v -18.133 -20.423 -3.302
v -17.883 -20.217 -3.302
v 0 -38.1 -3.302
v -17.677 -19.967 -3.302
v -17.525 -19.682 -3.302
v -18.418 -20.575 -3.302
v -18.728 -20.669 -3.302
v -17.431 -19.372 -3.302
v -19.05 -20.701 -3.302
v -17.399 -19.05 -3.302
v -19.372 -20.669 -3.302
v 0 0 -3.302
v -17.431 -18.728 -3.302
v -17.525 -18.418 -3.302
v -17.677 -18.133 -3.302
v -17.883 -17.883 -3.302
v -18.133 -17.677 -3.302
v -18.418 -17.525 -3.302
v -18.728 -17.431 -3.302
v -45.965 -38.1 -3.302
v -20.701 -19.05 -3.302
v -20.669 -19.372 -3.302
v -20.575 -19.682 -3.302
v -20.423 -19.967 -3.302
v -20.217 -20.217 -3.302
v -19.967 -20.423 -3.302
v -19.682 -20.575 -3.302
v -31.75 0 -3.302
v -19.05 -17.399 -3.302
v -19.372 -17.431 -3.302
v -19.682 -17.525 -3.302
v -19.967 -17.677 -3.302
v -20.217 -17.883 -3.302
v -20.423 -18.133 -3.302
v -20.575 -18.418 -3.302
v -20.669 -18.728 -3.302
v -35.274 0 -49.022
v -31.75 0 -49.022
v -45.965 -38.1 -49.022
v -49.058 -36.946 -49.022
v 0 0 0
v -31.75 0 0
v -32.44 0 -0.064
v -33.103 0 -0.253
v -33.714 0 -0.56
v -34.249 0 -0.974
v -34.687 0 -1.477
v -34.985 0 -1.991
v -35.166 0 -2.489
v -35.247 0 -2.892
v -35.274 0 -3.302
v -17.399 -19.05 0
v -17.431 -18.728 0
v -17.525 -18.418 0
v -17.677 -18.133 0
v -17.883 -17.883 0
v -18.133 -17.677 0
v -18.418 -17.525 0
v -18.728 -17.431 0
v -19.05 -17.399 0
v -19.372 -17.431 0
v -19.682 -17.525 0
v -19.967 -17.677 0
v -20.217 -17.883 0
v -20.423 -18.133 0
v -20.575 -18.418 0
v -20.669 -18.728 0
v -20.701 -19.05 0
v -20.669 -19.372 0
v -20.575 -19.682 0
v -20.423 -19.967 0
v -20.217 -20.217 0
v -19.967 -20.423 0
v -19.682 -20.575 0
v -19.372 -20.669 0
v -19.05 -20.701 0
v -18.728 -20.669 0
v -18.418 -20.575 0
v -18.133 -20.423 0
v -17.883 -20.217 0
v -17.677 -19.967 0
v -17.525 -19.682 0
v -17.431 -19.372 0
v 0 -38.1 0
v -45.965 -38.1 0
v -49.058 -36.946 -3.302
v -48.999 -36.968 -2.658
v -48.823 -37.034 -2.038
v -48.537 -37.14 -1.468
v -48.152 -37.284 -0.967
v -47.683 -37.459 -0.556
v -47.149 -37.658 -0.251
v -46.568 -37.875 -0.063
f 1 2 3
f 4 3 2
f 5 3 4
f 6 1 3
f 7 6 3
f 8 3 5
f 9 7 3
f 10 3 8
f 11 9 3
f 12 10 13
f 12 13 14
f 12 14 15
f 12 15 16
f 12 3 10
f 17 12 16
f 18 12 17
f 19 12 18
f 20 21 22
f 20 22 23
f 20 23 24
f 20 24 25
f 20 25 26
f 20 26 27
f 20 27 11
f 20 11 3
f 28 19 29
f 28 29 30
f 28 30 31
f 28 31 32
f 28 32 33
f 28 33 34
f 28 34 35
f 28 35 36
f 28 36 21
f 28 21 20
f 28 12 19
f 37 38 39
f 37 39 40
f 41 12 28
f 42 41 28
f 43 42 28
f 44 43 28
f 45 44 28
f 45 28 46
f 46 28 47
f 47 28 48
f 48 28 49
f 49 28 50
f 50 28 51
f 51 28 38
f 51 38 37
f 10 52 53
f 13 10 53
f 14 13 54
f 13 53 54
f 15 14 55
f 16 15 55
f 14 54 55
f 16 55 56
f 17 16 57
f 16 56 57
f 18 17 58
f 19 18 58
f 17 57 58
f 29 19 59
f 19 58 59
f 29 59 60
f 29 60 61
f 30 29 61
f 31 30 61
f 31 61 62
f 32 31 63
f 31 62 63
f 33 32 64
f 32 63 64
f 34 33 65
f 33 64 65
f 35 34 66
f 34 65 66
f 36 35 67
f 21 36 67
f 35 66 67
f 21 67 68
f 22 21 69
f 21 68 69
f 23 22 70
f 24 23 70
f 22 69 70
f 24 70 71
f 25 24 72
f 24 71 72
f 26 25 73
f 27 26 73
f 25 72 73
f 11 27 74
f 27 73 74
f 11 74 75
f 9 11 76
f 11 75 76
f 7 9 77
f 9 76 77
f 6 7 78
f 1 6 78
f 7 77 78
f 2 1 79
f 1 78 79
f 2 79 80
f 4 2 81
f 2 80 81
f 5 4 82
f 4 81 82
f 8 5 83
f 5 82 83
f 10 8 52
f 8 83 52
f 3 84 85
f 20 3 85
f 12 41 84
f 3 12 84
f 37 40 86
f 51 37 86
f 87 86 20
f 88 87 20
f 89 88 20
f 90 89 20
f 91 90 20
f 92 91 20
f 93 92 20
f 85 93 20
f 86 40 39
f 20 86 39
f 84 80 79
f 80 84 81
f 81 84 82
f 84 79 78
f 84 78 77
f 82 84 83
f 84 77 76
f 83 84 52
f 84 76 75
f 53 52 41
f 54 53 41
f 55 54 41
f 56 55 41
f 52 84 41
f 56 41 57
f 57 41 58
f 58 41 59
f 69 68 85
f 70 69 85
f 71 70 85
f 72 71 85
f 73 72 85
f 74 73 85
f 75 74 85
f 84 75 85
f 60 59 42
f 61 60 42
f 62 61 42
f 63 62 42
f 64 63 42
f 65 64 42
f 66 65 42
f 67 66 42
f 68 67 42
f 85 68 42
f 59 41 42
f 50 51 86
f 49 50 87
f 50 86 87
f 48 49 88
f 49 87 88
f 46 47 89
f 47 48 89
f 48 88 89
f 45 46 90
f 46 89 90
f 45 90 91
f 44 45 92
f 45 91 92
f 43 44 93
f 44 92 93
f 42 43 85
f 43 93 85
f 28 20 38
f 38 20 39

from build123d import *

# Parameters (mm, degrees)
SKETCH13_R              = 1.651
BASE_FLANGE5_DEPTH      = 3.302
EDGE_FLANGE4_START      = -51.763631849
EDGE_FLANGE4_DEPTH      = 40.665312179
CUT_EXTRUDE4_DEPTH      = 4.699
CUT_EXTRUDE4_DEPTH_BACK = 56.896


# Read off the part's stored shape, not the designer's step: Edge-Flange4
# Sheet-metal steps are written as plain solids
with BuildPart() as part:
    # Sketch13 → Base-Flange5 (new body)
    with BuildSketch(Plane.XY):
        Polygon((-31.75, 0), (0, 0), (0, -38.1), (-45.964697135, -38.1), align=None)
        with Locations((-19.05, -19.05)):
            Circle(SKETCH13_R, mode=Mode.SUBTRACT)
    extrude(amount=-BASE_FLANGE5_DEPTH)

    # Edge-Flange4 outline → Edge-Flange4 (add)
    with BuildSketch(Plane(origin=(0, 0, 0), x_dir=(0.9369164518419233, -0.34955337542060905, 0), z_dir=(0.34955337542060905, 0.9369164518419232, 0)).offset(EDGE_FLANGE4_START)):
        with BuildLine():
            ThreePointArc((-33.049097346, 3.302), (-32.081963937, 0.967133409), (-29.747097346, 0))
            Line((-29.747097346, 0), (-29.747097346, 49.022))
            Line((-29.747097346, 49.022), (-33.049097346, 49.022))
            Line((-33.049097346, 49.022), (-33.049097346, 3.302))
        make_face()
    extrude(amount=EDGE_FLANGE4_DEPTH)

    # Sketch51 → Cut-Extrude4 (cut, two sides: drawn at the far end of the back side and taken through both)
    with BuildSketch(Plane.XY.offset(-CUT_EXTRUDE4_DEPTH_BACK)):
        Polygon((-31.75, 0), (-35.274327056, 0), (-34.843698124, 1.154225246), align=None)
    extrude(amount=CUT_EXTRUDE4_DEPTH + CUT_EXTRUDE4_DEPTH_BACK, mode=Mode.SUBTRACT)


solid = part.part
